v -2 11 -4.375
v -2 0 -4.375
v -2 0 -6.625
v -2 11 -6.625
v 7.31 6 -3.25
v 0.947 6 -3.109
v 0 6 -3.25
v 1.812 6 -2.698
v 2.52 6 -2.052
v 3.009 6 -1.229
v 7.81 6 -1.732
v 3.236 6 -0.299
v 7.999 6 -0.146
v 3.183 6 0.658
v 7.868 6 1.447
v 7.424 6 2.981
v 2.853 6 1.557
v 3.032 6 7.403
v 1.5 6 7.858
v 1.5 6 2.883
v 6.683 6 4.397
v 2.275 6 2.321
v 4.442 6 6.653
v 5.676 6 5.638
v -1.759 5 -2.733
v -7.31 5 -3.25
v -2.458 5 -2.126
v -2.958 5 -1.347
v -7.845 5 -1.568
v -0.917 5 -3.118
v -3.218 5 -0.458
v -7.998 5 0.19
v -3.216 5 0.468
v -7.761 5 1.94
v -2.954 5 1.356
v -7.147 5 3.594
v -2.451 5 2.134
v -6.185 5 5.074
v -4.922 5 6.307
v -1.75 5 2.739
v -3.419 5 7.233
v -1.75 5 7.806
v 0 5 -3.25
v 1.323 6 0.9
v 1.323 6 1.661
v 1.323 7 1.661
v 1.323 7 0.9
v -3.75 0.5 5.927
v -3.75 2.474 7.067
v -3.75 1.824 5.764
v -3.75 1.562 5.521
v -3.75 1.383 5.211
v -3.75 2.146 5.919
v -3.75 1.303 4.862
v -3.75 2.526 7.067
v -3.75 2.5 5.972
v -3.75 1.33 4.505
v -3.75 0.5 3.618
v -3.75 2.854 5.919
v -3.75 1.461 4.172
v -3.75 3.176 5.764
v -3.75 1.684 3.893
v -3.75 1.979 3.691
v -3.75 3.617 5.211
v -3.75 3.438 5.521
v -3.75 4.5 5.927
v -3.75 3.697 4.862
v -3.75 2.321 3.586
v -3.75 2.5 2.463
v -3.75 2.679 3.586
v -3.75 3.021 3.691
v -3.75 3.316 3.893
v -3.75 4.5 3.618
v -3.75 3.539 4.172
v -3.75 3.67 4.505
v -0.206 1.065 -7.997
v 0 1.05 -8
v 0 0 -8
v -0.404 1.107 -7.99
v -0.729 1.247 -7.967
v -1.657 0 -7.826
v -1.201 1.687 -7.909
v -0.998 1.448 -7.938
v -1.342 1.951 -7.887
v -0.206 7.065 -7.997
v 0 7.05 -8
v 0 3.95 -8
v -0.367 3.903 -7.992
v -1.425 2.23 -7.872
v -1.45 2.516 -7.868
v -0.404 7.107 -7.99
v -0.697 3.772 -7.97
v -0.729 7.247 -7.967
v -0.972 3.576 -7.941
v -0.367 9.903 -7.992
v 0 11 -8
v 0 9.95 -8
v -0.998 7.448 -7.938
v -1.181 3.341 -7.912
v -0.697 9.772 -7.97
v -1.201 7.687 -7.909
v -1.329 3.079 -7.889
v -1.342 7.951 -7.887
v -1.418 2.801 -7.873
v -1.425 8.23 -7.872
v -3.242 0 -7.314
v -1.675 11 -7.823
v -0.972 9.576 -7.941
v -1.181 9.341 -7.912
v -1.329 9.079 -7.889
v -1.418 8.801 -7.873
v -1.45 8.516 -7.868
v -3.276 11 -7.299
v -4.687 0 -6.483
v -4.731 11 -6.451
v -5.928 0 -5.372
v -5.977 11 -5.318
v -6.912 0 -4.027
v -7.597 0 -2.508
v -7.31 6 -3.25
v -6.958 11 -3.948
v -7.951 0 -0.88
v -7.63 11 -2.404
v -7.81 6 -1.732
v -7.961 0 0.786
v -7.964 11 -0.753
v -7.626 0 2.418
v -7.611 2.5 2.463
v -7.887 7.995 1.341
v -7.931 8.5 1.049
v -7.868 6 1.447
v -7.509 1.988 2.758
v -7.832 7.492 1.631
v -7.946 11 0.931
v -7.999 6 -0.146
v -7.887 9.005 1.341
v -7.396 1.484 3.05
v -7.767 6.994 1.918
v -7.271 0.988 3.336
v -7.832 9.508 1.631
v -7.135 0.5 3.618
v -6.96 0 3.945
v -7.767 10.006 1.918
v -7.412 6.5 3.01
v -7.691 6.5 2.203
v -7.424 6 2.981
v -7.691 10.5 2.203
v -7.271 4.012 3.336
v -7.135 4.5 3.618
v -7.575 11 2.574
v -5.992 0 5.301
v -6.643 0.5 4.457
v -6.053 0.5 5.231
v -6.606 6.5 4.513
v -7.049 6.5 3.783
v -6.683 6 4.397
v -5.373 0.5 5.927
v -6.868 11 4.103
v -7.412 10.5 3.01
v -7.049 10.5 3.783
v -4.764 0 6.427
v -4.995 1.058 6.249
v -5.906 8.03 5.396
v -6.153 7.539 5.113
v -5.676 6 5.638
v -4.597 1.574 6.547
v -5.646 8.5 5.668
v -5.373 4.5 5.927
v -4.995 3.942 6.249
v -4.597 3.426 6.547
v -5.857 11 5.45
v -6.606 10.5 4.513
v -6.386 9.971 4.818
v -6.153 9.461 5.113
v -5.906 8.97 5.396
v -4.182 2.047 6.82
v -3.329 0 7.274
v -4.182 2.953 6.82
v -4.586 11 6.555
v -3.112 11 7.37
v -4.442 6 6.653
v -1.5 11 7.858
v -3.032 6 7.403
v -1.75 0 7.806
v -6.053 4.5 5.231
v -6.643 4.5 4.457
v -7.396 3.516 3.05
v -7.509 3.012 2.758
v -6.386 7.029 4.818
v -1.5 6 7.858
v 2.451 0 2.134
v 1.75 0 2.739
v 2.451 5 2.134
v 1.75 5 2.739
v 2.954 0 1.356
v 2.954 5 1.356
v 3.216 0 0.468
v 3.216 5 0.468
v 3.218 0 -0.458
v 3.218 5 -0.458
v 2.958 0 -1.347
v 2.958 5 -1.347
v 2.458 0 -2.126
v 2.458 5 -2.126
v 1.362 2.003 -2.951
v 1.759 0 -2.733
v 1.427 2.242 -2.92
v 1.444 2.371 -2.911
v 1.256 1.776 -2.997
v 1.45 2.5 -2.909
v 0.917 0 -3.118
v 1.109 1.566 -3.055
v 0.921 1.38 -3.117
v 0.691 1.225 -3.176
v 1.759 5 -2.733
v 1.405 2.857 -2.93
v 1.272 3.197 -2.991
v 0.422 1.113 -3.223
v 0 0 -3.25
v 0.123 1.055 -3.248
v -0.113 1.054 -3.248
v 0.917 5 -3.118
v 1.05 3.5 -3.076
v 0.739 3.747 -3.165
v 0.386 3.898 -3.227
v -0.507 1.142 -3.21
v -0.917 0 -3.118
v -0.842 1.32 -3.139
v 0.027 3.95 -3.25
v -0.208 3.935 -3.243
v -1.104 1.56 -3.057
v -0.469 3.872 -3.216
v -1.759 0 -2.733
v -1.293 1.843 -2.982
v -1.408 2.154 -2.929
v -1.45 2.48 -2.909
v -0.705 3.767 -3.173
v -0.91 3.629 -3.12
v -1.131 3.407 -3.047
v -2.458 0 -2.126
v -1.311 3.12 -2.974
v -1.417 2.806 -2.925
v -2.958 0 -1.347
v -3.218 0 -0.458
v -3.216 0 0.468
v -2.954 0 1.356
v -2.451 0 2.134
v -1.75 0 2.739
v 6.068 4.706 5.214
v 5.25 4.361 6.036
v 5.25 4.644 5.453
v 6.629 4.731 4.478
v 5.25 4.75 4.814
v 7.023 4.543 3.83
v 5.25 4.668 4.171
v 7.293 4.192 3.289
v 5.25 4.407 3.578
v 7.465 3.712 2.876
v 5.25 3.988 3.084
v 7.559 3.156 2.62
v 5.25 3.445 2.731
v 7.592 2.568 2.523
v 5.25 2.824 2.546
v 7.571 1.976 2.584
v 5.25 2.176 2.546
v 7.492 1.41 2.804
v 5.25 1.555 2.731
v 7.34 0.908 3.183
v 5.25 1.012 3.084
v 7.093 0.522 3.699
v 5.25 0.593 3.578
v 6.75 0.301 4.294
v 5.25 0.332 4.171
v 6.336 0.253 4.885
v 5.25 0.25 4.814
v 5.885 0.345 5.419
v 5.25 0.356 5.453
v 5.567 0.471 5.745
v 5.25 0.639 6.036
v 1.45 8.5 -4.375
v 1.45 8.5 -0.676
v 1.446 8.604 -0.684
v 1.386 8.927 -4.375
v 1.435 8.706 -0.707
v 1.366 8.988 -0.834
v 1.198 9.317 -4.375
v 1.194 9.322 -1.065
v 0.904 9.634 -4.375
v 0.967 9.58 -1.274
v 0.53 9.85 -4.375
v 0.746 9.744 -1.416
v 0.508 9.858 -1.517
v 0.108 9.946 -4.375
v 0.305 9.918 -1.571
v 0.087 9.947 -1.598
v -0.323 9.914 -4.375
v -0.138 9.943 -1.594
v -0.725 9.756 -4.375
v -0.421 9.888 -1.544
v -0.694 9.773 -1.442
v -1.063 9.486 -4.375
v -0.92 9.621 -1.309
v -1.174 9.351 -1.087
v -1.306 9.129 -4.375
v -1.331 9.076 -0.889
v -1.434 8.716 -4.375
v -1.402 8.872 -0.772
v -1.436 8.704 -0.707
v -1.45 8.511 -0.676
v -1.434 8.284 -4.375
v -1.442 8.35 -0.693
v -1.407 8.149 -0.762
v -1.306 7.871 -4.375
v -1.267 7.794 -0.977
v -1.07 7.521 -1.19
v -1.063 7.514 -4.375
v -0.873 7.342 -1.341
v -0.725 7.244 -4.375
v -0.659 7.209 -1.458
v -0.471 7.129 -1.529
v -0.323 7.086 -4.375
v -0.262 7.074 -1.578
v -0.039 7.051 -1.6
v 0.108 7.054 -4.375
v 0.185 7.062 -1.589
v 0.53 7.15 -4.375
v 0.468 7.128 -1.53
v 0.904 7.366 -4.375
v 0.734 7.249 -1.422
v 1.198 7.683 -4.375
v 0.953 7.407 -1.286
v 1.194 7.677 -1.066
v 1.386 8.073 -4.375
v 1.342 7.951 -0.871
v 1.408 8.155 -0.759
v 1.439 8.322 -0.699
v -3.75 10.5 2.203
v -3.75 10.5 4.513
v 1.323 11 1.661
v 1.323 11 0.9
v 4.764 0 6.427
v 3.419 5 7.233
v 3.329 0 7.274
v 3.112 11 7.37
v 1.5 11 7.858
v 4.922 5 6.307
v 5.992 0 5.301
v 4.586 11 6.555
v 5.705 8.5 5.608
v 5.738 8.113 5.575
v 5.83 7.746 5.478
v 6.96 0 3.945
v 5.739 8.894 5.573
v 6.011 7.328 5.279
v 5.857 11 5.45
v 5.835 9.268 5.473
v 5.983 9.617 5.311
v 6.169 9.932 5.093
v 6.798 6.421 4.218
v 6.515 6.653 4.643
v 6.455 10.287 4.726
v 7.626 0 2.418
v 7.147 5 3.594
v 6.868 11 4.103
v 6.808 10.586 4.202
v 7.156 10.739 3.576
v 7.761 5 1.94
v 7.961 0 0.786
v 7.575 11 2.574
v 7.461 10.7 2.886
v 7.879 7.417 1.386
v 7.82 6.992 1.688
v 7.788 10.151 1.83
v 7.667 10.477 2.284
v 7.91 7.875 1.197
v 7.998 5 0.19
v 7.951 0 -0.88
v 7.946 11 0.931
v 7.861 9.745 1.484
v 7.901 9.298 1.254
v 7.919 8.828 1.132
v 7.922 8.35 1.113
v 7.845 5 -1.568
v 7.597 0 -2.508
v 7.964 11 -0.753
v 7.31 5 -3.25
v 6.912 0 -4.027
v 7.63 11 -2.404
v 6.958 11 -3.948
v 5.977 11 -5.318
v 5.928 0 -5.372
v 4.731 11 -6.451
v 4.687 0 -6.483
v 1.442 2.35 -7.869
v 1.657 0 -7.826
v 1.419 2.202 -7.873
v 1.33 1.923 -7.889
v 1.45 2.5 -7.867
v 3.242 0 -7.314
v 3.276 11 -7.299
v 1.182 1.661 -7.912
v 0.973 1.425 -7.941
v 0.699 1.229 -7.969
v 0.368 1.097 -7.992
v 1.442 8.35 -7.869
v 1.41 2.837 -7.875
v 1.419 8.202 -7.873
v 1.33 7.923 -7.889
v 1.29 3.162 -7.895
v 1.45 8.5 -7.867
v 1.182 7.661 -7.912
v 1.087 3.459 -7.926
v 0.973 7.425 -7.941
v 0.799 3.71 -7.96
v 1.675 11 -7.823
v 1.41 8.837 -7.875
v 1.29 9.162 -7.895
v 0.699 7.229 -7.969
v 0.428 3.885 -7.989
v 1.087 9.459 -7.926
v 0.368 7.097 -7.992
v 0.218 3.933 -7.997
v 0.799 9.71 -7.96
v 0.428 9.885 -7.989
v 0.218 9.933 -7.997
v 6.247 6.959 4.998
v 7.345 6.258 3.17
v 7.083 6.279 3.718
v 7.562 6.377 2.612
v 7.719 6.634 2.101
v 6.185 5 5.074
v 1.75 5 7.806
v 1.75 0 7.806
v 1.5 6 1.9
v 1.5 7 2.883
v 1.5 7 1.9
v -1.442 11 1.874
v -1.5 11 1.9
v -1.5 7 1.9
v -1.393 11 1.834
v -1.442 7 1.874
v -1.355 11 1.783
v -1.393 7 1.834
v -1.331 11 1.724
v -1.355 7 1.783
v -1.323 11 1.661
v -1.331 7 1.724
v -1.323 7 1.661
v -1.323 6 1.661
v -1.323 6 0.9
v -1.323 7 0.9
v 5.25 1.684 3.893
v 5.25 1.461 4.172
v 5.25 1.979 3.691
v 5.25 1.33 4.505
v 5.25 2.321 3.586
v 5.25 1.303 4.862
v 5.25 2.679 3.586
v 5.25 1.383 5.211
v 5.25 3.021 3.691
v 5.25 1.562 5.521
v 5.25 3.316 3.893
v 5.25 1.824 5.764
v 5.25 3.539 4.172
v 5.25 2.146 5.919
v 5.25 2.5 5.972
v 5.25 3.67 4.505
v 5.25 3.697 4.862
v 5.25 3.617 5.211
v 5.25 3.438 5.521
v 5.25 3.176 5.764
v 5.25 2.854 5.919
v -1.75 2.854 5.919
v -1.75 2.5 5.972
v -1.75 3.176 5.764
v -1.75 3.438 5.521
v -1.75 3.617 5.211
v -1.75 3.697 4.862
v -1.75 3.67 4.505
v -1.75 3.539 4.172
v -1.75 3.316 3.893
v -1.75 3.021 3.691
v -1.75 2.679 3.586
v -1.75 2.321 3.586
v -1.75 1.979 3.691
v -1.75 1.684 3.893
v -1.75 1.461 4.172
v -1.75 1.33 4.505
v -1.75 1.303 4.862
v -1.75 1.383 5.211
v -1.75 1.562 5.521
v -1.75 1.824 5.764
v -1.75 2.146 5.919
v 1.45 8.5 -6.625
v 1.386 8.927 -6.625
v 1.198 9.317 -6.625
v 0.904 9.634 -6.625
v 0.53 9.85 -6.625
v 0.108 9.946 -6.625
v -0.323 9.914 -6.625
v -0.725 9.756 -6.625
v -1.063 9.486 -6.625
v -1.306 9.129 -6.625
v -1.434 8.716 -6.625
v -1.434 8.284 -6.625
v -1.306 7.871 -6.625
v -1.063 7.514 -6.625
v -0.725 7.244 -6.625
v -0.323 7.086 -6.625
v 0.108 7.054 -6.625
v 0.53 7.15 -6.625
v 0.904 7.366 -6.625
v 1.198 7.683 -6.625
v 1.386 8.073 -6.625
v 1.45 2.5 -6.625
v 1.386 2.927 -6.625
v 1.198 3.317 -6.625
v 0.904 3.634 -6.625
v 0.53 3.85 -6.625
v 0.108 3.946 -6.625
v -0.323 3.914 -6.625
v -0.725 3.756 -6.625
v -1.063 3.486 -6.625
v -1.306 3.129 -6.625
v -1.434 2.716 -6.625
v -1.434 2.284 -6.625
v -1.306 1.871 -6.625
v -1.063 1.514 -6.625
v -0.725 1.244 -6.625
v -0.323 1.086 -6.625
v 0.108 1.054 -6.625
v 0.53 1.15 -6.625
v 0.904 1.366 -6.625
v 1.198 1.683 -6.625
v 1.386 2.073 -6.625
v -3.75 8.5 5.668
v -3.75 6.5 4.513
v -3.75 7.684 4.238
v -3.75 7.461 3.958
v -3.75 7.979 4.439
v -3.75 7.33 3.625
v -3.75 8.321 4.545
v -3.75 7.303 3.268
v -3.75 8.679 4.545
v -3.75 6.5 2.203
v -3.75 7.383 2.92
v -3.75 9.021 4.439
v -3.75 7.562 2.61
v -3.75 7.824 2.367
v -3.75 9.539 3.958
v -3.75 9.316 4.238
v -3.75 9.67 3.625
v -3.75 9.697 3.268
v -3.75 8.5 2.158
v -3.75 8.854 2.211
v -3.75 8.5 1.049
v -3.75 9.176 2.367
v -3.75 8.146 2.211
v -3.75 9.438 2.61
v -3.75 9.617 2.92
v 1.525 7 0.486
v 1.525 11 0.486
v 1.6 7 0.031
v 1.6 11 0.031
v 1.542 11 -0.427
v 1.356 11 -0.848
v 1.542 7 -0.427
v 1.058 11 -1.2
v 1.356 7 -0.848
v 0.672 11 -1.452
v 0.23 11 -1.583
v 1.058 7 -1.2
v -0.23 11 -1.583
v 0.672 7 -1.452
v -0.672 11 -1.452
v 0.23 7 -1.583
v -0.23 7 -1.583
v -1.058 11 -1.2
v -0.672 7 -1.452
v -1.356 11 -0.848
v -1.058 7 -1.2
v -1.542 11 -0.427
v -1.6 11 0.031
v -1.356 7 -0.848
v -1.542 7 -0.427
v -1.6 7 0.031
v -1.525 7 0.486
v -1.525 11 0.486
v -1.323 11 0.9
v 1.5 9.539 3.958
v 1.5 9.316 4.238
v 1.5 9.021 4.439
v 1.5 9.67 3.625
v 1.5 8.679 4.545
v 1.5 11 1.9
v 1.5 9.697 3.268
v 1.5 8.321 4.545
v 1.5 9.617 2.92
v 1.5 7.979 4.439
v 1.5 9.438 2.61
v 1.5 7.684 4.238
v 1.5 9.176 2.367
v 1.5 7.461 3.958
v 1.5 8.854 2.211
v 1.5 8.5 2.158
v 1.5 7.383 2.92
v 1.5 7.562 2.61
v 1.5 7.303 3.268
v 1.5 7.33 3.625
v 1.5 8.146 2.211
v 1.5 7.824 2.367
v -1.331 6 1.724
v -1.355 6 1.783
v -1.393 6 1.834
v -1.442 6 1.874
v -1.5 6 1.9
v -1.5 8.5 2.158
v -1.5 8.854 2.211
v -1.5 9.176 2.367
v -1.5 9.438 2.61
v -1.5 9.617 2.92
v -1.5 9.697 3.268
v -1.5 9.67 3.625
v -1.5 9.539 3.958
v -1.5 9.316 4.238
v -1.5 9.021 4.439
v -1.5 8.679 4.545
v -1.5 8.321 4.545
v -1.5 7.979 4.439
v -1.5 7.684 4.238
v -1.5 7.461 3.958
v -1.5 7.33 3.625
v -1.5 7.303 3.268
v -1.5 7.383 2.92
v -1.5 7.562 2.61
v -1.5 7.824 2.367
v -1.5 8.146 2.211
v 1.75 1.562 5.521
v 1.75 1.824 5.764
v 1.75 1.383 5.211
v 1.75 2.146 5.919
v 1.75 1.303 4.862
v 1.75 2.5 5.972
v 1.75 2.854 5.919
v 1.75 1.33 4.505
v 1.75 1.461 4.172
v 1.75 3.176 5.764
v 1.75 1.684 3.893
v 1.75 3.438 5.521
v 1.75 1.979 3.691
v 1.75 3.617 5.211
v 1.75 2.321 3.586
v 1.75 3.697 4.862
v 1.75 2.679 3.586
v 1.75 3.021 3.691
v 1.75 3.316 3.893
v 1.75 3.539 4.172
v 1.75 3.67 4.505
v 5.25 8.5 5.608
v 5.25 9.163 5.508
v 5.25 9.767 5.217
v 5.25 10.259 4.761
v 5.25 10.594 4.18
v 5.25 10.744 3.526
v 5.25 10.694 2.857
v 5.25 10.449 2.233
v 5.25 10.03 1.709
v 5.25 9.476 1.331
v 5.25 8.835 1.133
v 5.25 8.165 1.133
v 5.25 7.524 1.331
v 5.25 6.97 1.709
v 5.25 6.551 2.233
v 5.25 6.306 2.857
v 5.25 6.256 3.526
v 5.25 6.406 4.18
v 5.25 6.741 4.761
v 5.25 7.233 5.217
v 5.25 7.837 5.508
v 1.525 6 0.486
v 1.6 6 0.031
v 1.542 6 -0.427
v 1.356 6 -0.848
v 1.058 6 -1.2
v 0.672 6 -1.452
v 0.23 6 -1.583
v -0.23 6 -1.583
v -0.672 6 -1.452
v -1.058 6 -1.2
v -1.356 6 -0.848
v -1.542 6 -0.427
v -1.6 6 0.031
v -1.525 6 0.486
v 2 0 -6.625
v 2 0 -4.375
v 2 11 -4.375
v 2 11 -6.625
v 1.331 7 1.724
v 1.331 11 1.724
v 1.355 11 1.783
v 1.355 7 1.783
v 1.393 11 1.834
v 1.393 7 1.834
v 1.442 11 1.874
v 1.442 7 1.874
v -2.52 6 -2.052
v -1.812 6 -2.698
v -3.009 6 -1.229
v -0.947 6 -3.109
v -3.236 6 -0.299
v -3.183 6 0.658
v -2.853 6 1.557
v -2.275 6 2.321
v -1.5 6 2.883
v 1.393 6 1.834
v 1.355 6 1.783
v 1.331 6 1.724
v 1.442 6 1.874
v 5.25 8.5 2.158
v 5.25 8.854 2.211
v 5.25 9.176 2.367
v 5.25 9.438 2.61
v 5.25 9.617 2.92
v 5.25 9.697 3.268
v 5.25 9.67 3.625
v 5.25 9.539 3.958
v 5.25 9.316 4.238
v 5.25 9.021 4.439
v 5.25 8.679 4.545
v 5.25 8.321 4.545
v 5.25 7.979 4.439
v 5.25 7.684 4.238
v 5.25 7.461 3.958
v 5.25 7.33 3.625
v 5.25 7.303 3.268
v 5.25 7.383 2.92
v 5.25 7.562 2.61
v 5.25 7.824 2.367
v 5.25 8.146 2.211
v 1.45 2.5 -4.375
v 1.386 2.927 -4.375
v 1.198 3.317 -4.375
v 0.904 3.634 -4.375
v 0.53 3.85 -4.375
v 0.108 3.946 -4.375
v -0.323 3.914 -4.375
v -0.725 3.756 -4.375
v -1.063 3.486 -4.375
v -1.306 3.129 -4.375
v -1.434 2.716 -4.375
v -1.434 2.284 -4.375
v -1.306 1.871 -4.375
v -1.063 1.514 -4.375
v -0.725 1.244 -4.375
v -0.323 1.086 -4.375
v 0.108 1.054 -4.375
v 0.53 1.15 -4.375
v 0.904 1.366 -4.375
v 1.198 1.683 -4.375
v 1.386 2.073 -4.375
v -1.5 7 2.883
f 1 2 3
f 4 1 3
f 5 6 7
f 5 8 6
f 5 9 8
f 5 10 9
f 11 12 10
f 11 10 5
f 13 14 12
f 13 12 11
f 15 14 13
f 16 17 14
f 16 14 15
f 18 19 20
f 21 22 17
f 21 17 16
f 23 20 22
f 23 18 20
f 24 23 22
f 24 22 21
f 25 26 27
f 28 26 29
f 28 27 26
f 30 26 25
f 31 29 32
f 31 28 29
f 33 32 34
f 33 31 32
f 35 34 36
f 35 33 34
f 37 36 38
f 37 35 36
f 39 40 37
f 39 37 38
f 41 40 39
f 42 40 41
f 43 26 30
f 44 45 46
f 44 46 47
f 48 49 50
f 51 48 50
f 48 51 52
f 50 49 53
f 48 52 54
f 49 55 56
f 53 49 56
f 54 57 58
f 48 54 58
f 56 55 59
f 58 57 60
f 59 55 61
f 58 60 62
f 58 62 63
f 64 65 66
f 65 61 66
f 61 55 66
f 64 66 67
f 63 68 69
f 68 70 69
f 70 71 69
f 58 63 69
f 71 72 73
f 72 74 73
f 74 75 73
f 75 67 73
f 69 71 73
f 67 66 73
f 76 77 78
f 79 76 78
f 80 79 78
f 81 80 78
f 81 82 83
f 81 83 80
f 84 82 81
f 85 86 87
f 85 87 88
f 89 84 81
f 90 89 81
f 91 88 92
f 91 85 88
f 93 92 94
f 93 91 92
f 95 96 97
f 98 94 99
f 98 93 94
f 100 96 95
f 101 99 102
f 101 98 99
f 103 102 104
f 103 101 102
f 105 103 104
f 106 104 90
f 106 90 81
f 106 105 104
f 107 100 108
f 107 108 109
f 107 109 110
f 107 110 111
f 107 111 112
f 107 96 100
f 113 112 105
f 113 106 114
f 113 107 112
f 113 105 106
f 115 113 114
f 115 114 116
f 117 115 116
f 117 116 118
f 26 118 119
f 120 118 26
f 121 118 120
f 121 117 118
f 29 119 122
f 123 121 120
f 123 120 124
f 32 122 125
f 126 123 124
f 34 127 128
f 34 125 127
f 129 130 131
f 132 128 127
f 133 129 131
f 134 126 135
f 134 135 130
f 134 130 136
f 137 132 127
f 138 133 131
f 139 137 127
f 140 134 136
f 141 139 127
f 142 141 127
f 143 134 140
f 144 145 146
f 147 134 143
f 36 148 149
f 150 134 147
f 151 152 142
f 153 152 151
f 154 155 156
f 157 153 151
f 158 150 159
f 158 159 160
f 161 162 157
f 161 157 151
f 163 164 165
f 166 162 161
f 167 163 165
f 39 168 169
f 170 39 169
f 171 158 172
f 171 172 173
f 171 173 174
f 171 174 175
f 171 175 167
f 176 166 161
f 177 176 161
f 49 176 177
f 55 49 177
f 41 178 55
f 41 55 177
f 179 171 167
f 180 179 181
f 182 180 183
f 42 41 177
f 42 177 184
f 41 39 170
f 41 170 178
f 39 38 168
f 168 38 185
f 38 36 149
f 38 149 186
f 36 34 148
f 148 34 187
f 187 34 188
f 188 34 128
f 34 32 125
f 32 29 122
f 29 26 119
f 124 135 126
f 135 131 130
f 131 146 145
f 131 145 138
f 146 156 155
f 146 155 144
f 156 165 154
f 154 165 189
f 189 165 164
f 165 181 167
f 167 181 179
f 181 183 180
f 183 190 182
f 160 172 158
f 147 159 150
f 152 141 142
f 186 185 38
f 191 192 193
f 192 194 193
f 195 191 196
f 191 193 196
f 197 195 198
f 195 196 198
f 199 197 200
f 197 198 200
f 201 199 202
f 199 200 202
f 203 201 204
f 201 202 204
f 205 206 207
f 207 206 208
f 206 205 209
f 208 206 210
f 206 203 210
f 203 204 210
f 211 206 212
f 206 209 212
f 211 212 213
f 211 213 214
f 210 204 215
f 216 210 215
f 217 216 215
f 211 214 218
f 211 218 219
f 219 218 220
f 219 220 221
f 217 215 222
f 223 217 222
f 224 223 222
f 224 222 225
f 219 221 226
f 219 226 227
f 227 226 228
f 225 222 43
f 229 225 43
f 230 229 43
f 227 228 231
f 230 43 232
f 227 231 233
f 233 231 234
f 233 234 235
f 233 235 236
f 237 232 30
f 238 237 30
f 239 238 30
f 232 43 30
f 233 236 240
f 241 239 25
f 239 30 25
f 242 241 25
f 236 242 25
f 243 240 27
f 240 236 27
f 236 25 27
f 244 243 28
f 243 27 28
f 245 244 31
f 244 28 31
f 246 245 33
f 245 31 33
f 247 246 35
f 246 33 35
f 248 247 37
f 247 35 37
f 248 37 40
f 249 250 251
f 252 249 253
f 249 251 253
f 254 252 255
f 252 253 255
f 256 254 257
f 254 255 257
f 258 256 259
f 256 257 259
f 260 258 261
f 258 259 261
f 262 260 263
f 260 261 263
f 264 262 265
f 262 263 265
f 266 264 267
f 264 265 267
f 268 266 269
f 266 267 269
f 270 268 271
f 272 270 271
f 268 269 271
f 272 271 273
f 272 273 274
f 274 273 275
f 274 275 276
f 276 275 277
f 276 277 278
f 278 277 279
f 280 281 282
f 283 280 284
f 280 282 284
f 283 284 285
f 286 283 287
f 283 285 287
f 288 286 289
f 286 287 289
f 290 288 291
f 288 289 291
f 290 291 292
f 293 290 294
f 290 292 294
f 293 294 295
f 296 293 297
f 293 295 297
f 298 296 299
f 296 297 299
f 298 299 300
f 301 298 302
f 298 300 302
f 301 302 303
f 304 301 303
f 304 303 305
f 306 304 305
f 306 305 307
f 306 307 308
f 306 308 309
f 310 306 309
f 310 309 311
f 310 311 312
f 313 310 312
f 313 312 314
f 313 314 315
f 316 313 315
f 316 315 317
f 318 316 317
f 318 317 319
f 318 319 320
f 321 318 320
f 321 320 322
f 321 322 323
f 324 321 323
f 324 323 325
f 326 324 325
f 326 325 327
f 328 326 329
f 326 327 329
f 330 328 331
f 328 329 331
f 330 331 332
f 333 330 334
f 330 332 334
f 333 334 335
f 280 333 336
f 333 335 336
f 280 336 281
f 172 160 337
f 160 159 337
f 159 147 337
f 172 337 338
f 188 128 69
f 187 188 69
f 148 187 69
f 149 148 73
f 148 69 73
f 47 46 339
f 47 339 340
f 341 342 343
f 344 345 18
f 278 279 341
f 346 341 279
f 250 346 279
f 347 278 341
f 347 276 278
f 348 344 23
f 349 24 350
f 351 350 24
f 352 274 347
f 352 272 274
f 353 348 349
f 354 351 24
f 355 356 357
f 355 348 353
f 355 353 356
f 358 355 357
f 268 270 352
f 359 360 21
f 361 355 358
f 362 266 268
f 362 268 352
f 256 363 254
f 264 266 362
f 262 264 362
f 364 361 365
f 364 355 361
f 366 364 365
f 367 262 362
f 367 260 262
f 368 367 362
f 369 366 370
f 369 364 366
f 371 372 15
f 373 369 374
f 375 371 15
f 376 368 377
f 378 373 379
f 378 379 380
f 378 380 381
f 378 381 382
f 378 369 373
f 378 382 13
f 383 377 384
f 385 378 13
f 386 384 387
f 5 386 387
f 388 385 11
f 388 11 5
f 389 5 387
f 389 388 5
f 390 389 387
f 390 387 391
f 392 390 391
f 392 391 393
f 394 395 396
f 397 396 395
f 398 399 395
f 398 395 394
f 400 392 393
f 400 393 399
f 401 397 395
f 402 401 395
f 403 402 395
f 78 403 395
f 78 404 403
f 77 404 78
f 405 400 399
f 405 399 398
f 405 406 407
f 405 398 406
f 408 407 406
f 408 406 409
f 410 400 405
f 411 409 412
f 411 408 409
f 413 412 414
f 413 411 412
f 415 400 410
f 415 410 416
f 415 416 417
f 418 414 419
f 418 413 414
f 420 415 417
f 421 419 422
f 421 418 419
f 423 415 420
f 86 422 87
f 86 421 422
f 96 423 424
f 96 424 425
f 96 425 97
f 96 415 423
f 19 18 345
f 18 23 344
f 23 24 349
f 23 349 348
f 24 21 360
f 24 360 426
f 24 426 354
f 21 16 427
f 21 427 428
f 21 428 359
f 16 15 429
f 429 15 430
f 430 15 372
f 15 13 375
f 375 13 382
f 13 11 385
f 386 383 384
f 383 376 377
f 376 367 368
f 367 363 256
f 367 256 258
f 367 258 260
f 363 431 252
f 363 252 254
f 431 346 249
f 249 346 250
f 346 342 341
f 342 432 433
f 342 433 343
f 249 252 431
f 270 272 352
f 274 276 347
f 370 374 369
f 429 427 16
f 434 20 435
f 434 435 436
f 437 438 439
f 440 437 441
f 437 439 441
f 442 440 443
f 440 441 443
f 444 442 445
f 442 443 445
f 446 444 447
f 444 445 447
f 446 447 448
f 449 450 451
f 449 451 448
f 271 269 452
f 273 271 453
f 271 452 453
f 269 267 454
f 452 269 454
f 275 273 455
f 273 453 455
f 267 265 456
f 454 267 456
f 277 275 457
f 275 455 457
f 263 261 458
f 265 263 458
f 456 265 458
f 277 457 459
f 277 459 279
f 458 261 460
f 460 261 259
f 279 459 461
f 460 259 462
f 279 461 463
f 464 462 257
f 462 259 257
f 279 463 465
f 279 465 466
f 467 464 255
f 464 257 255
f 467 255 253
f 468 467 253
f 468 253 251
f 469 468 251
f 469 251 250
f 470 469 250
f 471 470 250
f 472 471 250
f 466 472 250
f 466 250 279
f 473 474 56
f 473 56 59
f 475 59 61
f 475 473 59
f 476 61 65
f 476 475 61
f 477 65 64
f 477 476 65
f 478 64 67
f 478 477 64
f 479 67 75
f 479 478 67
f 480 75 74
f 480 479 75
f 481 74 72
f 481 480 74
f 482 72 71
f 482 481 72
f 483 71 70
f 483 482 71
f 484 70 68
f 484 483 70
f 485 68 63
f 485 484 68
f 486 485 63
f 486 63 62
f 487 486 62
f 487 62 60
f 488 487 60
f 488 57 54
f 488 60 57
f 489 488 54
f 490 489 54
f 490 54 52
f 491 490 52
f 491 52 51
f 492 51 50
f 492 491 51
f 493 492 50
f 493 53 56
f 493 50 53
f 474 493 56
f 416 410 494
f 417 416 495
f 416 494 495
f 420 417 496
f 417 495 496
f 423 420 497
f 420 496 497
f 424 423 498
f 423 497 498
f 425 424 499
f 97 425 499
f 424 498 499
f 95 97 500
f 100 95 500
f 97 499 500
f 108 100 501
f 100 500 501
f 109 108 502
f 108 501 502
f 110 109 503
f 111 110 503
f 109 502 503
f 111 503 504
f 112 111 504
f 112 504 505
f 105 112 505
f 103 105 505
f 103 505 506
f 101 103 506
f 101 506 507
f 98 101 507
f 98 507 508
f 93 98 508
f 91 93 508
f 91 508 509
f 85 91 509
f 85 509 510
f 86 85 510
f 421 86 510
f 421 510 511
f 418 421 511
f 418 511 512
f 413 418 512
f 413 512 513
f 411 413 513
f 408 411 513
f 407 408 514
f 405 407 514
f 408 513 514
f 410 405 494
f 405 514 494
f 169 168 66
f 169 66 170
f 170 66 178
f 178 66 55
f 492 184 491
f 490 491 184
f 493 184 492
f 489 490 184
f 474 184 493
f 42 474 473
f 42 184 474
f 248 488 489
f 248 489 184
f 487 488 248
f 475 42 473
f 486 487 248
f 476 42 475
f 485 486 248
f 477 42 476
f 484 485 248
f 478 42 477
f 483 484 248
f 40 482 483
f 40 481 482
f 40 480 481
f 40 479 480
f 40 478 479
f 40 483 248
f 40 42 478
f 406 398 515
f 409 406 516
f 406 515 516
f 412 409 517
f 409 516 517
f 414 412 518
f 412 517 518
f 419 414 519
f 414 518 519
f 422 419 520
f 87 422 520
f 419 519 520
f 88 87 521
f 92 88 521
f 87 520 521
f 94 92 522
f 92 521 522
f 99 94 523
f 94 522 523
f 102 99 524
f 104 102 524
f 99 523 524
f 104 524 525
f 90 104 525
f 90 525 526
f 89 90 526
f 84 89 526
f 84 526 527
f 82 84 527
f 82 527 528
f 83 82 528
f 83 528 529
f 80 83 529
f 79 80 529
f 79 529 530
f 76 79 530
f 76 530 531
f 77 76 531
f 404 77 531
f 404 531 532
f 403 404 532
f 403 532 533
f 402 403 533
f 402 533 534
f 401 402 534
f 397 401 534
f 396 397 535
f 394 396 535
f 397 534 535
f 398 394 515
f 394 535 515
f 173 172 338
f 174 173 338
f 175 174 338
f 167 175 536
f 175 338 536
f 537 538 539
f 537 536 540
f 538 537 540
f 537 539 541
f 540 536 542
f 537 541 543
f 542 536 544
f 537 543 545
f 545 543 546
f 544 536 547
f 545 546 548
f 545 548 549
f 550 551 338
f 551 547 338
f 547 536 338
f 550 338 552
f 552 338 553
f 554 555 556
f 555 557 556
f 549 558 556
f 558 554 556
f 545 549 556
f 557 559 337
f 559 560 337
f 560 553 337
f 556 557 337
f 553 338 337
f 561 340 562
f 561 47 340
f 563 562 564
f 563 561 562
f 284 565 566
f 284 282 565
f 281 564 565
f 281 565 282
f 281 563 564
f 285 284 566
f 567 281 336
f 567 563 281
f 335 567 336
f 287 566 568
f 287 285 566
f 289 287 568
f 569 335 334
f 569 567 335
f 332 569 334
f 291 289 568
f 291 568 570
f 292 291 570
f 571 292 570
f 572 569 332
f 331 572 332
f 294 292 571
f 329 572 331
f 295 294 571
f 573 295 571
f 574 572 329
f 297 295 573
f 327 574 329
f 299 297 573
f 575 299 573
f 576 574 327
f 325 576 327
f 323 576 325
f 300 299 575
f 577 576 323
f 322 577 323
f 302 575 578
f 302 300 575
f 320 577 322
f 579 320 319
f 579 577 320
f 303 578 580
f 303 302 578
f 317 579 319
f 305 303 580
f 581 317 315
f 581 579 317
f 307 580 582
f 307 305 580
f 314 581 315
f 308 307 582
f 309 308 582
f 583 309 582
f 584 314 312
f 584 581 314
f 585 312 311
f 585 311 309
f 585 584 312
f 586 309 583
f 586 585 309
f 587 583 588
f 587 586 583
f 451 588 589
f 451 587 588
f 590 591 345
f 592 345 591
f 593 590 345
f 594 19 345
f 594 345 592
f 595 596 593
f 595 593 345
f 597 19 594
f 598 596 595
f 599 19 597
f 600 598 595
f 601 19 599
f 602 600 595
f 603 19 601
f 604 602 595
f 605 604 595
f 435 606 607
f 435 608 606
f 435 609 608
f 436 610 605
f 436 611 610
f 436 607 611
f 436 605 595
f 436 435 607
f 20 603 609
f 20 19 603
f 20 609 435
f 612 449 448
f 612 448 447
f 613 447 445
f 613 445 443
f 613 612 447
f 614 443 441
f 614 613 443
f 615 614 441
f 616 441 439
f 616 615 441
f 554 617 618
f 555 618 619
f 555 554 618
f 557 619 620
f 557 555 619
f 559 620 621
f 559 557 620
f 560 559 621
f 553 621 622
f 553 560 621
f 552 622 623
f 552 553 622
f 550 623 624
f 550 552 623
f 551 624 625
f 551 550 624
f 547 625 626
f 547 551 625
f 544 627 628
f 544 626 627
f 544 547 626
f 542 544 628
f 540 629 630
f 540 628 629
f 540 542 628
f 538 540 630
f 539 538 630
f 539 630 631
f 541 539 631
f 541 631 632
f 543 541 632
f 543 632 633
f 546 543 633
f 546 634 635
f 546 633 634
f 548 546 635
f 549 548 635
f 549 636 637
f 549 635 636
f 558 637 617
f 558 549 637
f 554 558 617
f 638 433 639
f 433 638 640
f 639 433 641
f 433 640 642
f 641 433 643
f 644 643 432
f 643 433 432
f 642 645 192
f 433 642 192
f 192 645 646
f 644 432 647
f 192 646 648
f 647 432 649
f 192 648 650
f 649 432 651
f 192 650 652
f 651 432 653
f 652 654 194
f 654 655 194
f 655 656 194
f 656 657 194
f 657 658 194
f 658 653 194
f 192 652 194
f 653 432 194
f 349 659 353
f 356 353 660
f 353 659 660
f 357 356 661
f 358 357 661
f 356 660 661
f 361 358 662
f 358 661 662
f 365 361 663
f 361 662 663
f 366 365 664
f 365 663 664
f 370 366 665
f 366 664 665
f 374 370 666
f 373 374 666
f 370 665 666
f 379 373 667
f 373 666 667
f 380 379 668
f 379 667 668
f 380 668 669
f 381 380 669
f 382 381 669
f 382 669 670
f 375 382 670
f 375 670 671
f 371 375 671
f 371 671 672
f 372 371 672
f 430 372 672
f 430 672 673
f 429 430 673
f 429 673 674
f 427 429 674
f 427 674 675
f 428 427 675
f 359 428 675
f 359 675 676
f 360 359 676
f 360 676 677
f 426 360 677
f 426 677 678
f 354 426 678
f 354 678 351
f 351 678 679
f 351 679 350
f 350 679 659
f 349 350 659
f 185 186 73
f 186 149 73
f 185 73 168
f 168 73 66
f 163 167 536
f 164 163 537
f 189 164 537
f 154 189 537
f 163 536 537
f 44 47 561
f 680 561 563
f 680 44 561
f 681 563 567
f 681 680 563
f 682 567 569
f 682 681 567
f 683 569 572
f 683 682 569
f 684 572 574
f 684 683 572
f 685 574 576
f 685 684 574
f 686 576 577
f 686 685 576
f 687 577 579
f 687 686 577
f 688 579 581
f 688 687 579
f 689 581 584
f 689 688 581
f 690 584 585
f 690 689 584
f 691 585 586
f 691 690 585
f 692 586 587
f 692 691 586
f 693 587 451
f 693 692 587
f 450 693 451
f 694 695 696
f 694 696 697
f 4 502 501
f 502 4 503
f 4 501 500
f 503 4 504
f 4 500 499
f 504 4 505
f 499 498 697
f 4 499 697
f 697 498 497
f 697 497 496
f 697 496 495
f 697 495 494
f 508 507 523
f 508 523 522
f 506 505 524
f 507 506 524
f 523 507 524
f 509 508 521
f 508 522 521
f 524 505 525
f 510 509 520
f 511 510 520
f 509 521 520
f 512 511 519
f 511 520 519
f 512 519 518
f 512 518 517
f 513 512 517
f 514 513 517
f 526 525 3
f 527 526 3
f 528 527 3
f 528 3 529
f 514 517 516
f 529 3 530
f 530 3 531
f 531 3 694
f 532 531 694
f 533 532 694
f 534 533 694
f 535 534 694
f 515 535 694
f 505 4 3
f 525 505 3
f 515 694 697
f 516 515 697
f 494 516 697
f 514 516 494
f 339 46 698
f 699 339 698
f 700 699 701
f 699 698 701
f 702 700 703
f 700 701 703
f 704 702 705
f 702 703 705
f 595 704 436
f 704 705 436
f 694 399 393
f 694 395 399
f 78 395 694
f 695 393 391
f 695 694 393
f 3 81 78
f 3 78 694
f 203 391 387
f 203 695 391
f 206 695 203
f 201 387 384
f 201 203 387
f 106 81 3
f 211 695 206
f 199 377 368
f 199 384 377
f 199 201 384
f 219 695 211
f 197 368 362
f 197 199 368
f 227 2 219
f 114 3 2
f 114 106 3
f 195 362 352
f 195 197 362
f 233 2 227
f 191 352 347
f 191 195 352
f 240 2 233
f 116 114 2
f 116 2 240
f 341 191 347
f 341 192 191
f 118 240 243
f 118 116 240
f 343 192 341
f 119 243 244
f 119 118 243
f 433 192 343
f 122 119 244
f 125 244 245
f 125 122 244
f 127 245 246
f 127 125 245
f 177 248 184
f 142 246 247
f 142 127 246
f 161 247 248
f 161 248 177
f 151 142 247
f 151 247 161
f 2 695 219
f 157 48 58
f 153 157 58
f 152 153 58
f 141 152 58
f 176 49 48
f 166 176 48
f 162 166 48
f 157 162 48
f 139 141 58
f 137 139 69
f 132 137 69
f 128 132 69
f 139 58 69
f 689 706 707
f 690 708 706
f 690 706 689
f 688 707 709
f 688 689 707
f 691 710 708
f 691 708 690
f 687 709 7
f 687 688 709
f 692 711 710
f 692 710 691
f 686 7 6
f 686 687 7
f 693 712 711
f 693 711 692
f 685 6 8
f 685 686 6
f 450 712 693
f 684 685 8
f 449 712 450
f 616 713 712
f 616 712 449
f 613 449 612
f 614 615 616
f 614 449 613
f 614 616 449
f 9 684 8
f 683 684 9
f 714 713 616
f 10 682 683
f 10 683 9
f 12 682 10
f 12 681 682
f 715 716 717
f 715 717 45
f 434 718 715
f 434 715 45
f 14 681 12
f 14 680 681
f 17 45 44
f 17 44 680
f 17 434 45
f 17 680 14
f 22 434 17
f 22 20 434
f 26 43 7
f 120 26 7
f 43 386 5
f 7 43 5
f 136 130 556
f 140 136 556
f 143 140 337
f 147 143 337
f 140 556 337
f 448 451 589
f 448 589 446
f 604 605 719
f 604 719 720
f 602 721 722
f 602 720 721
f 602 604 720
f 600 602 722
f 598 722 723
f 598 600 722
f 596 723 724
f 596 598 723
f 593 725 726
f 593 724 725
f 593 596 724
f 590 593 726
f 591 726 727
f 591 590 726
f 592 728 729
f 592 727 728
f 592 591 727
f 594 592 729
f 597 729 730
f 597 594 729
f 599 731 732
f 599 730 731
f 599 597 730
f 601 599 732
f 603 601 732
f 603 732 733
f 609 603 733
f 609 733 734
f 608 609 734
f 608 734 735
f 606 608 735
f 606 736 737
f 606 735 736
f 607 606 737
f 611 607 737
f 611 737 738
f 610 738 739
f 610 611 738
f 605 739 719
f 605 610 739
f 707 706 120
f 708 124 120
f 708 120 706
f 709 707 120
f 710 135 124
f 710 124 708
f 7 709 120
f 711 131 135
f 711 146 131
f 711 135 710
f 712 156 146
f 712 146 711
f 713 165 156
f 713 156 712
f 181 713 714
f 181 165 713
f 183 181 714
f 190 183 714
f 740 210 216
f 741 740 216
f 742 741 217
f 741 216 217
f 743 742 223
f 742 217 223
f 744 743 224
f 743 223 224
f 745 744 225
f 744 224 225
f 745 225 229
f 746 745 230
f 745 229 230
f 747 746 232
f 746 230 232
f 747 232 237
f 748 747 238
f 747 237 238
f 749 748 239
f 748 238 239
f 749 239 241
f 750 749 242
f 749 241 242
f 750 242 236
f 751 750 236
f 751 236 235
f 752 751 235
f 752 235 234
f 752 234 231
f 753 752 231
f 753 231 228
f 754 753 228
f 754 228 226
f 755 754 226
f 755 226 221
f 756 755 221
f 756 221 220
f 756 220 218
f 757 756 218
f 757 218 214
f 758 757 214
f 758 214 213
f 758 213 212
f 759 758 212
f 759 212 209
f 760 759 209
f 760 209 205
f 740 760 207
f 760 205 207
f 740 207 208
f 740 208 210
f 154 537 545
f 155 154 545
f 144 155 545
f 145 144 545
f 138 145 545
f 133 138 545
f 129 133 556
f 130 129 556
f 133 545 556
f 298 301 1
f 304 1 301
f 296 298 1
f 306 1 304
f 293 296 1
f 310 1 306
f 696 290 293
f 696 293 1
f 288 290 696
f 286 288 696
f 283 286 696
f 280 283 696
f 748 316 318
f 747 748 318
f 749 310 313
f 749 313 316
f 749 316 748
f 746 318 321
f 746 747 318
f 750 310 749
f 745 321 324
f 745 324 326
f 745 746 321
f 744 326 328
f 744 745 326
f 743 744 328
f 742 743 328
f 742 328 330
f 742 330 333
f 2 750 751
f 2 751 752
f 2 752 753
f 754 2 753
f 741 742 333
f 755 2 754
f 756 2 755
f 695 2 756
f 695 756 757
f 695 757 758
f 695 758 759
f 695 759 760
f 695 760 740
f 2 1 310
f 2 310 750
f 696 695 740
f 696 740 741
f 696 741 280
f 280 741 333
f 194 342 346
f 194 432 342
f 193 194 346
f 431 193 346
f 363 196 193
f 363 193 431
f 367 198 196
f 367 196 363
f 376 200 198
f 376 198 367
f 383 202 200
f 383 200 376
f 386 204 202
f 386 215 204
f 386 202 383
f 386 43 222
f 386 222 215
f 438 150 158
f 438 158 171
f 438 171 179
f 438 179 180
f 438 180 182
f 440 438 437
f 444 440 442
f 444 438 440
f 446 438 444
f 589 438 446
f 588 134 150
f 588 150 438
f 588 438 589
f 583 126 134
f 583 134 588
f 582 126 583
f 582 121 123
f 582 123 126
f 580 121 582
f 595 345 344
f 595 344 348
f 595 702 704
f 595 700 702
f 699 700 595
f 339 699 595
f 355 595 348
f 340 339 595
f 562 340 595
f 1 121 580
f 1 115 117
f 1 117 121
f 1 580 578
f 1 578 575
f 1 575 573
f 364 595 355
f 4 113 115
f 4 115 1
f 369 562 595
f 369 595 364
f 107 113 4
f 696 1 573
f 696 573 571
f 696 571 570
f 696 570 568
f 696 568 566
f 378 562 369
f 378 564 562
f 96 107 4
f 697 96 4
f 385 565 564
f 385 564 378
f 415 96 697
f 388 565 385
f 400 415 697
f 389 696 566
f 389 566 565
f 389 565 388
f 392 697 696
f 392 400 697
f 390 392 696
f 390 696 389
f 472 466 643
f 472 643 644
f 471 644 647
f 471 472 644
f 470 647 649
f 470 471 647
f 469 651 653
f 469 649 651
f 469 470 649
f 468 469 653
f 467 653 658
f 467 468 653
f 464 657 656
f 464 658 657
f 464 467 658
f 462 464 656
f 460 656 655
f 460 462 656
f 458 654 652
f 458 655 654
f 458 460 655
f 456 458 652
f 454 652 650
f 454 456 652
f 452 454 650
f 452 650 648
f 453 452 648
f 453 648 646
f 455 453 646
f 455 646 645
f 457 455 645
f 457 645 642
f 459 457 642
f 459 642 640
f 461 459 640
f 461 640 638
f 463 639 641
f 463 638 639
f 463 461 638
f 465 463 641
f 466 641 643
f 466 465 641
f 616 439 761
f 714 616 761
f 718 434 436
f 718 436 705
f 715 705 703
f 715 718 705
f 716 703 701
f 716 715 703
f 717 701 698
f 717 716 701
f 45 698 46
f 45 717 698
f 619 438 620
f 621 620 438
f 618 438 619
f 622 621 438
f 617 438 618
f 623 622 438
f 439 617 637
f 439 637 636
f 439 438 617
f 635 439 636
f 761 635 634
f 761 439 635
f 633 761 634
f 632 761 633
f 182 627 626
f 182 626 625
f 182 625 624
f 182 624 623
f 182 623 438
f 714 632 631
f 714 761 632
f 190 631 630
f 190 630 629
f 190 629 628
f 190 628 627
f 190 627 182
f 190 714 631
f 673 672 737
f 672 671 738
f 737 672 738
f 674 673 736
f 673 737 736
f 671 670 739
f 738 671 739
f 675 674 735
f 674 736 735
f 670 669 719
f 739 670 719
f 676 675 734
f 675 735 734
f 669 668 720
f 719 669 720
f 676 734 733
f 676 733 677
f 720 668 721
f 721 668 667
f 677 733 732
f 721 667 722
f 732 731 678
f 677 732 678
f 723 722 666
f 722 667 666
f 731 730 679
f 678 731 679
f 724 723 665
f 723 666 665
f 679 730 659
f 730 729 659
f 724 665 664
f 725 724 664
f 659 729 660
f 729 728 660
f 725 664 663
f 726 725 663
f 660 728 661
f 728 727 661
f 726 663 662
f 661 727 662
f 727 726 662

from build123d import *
from build123d.topology import SkipClean

# Parameters (mm, degrees)
SKETCH1_W                            = 4.75
SKETCH1_H                            = 7
FILLET1_R                            = 1
SKETCH16_W                           = 16
SKETCH16_H                           = 1
CUT_EXTRUDE5_DEPTH                   = 1
CUT_EXTRUDE5_DIRECTION_2_REACH       = 18.492
CUT_EXTRUDE6_REACH                   = 15.304
SKETCH17_W                           = 3.5
SKETCH17_H                           = 5.261387212
CUT_EXTRUDE7_DEPTH                   = 18.408690359
CUT_EXTRUDE7_DEPTH_BACK              = 18.408690359
SKETCH18_R                           = 1.2
CUT_EXTRUDE10_START                  = -6
SKETCH21_R                           = 1.6
CUT_EXTRUDE10_DEPTH                  = 6
CUT_EXTRUDE11_DEPTH                  = 18.26991621
CUT_EXTRUDE11_DEPTH_BACK             = 18.26991621
SKETCH22_R                           = 1.2
CUT_EXTRUDE9_REACH                   = 20.603
CUT_EXTRUDE9_END_RADIUS              = 8
SKETCH20_R                           = 1.2
CUT_EXTRUDE12_REACH                  = 21.585
SKETCH19_R                           = 2.25
CUT_EXTRUDE13_REACH                  = 21.585
CUT_EXTRUDE13_END_RADIUS             = 8
SKETCH24_R                           = 2.25
CUT_EXTRUDE14_REACH                  = 18.492
CUT_EXTRUDE14_END_RADIUS             = 8
SKETCH25_W                           = 2.25
SKETCH25_H                           = 1
CUT_EXTRUDE14_DIRECTION_2_REACH      = 18.492
CUT_EXTRUDE14_DIRECTION_2_END_RADIUS = 8
M2_5_CLEARANCE_HOLE1_D               = 2.9
M2_5_CLEARANCE_HOLE1_DEPTH           = 8.029752102
M2_5_CLEARANCE_HOLE1_TIP             = 0.871247898
CUT_EXTRUDE15_START                  = -12
SKETCH29_W                           = 4
SKETCH29_H                           = 2.25
CUT_EXTRUDE15_DEPTH                  = 12
FILLET3_R                            = 0.25
SKETCH30_R                           = 8
CUT_EXTRUDE19_DEPTH                  = 1
BOSS_EXTRUDE1_START                  = 1
BOSS_EXTRUDE1_DEPTH                  = 1


with BuildPart() as part:
    # Sketch1 → Revolve1 (revolve)
    with BuildSketch(Plane.XY, mode=Mode.PRIVATE) as revolve1_sk:
        with Locations((5.625, 3.5)):
            Rectangle(SKETCH1_W, SKETCH1_H)
    revolve(revolve1_sk.sketch.rotate(Axis((0, 0, 0), (0, 1, 0)), 90), axis=Axis((0, 0, 0), (0, 1, 0)))

    # Sketch1<3> → Revolve2 (revolve)
    with BuildSketch(Plane.XY, mode=Mode.PRIVATE) as revolve2_sk:
        Polygon((1.6, 7), (3.25, 7), (8, 7), (8, 12), (1.6, 12), align=None)
    revolve(revolve2_sk.sketch.rotate(Axis((0, 0, 0), (0, 1, 0)), 90), axis=Axis((0, 0, 0), (0, 1, 0)))

    # Fillet1
    fillet1_edges = [part.edges().sort_by_distance(p)[0] for p in [
        (0, 12, 8),
    ]]
    fillet(fillet1_edges, radius=FILLET1_R)

    # Sketch16 → Cut-Extrude5 (cut)
    with BuildSketch(Plane.XY):
        with Locations((0, 5.5)):
            Rectangle(SKETCH16_W, SKETCH16_H)
    extrude(amount=-CUT_EXTRUDE5_DEPTH, mode=Mode.SUBTRACT)

    # Sketch16 → Cut-Extrude5 direction 2 (cut, up to next)
    with BuildSketch(Plane.XY, mode=Mode.PRIVATE) as cut_extrude5_direction_2_sk1:
        with Locations((0, 5.5)):
            Rectangle(SKETCH16_W, SKETCH16_H)
    cut_extrude5_direction_2_tool1 = extrude(cut_extrude5_direction_2_sk1.sketch, amount=CUT_EXTRUDE5_DIRECTION_2_REACH, mode=Mode.PRIVATE) & part.part
    add(cut_extrude5_direction_2_tool1.solids().sort_by_distance((0, 5.5, 0))[0], mode=Mode.SUBTRACT)

    # Sketch17 → Cut-Extrude6 (cut, up to next)
    with BuildSketch(Plane(origin=(0, 5, 0), x_dir=(1, 0, 0), z_dir=(0, 1, 0)), mode=Mode.PRIVATE) as cut_extrude6_sk1:
        with Locations((0, -5.369306394)):
            Rectangle(SKETCH17_W, SKETCH17_H)
    cut_extrude6_tool1 = extrude(cut_extrude6_sk1.sketch, amount=-CUT_EXTRUDE6_REACH, mode=Mode.PRIVATE) & part.part
    add(cut_extrude6_tool1.solids().sort_by_distance((0, 5, 5.369306))[0], mode=Mode.SUBTRACT)

    # Sketch18 → Cut-Extrude7 (cut, two sides: drawn at the far end of the back side and taken through both)
    with BuildSketch(Plane.ZY.offset(-1.75).offset(-CUT_EXTRUDE7_DEPTH_BACK)):
        with Locations((4.772430143, 2.5)):
            Circle(SKETCH18_R)
    extrude(amount=CUT_EXTRUDE7_DEPTH + CUT_EXTRUDE7_DEPTH_BACK, mode=Mode.SUBTRACT)

    # Sketch21 → Cut-Extrude10 (cut)
    with BuildSketch(Plane(origin=(0, 12, 0), x_dir=(1, 0, 0), z_dir=(0, 1, 0)).offset(CUT_EXTRUDE10_START)):
        Circle(SKETCH21_R)
        Polygon((-1.5, -1.9), (-1.5, -11.891029443), (1.5, -11.891029443), (1.5, -1.9), (1.322875656, -1.9), (1.322875656, -0.9), (-1.322875656, -0.9), (-1.322875656, -1.9), align=None)
    extrude(amount=CUT_EXTRUDE10_DEPTH, mode=Mode.SUBTRACT)

    # Sketch22 → Cut-Extrude11 (cut, two sides: drawn at the far end of the back side and taken through both)
    with BuildSketch(Plane(origin=(-1.5, 0, 0), x_dir=(0, 0, -1), z_dir=(1, 0, 0)).offset(-CUT_EXTRUDE11_DEPTH_BACK)):
        with Locations((-3.358116823, 8.5)):
            Circle(SKETCH22_R)
    extrude(amount=CUT_EXTRUDE11_DEPTH + CUT_EXTRUDE11_DEPTH_BACK, mode=Mode.SUBTRACT)

    # Cut-Extrude9: up to this cylinder (the profile starts inside it)
    cut_extrude9_end = Plane(origin=(0, 5.9847245, 0), z_dir=(0, -1, 0)) * Cylinder(CUT_EXTRUDE9_END_RADIUS, 65.175449, mode=Mode.PRIVATE)
    # Sketch20 → Cut-Extrude9 (cut, up to the surface)
    with BuildSketch(Plane(origin=(-3.75, 0, 0), x_dir=(0, 0, -1), z_dir=(1, 0, 0)), mode=Mode.PRIVATE) as cut_extrude9_sk1:
        Polygon((-2.463029066, 2.5), (-3.617729604, 4.5), (-5.927130681, 4.5), (-7.08183122, 2.5), (-5.927130681, 0.5), (-3.617729604, 0.5), align=None)
    cut_extrude9_tool1 = extrude(cut_extrude9_sk1.sketch, amount=-CUT_EXTRUDE9_REACH, mode=Mode.PRIVATE) & cut_extrude9_end
    add(cut_extrude9_tool1.solids().sort_by_distance((-3.75, 2.5, 4.77243))[0], mode=Mode.SUBTRACT)
    # Sketch20 → Cut-Extrude9 (cut, up to the surface)
    with BuildSketch(Plane(origin=(-3.75, 0, 0), x_dir=(0, 0, -1), z_dir=(1, 0, 0)), mode=Mode.PRIVATE) as cut_extrude9_sk2:
        Polygon((-1.048715746, 8.5), (-2.203416284, 10.5), (-4.512817361, 10.5), (-5.6675179, 8.5), (-4.512817361, 6.5), (-2.203416284, 6.5), align=None)
        with Locations((-3.358116823, 8.5)):
            Circle(SKETCH20_R, mode=Mode.SUBTRACT)
    cut_extrude9_tool2 = extrude(cut_extrude9_sk2.sketch, amount=-CUT_EXTRUDE9_REACH, mode=Mode.PRIVATE) & cut_extrude9_end
    add(cut_extrude9_tool2.solids().sort_by_distance((-3.75, 9.469449, 1.678981))[0], mode=Mode.SUBTRACT)

    # Sketch19 → Cut-Extrude12 (cut, up to next)
    with BuildSketch(Plane.ZY.offset(-5.25), mode=Mode.PRIVATE) as cut_extrude12_sk1:
        with Locations((4.772430143, 2.5)):
            Circle(SKETCH19_R)
    cut_extrude12_tool1 = extrude(cut_extrude12_sk1.sketch, amount=-CUT_EXTRUDE12_REACH, mode=Mode.PRIVATE) & part.part
    add(cut_extrude12_tool1.solids().sort_by_distance((5.25, 2.5, 4.77243))[0], mode=Mode.SUBTRACT)

    # Cut-Extrude13: up to this cylinder (the profile starts inside it)
    cut_extrude13_end = Plane(origin=(0, 8.5, 0), z_dir=(0, -1, 0)) * Cylinder(CUT_EXTRUDE13_END_RADIUS, 60.17, mode=Mode.PRIVATE)
    # Sketch24 → Cut-Extrude13 (cut, up to the surface)
    with BuildSketch(Plane.ZY.offset(-5.25), mode=Mode.PRIVATE) as cut_extrude13_sk1:
        with Locations((3.358116823, 8.5)):
            Circle(SKETCH24_R)
    cut_extrude13_tool1 = extrude(cut_extrude13_sk1.sketch, amount=-CUT_EXTRUDE13_REACH, mode=Mode.PRIVATE) & cut_extrude13_end
    add(cut_extrude13_tool1.solids().sort_by_distance((5.25, 8.5, 3.358117))[0], mode=Mode.SUBTRACT)

    # Cut-Extrude14: up to this cylinder (the profile starts inside it)
    cut_extrude14_end = Plane(origin=(0, 5.5, 0), z_dir=(0, -1, 0)) * Cylinder(CUT_EXTRUDE14_END_RADIUS, 53.984, mode=Mode.PRIVATE)
    # Sketch25 → Cut-Extrude14 (cut, up to the surface)
    with BuildSketch(Plane.ZY, mode=Mode.PRIVATE) as cut_extrude14_sk1:
        with Locations((-2.125, 5.5)):
            Rectangle(SKETCH25_W, SKETCH25_H)
    cut_extrude14_tool1 = extrude(cut_extrude14_sk1.sketch, amount=-CUT_EXTRUDE14_REACH, mode=Mode.PRIVATE) & cut_extrude14_end
    add(cut_extrude14_tool1.solids().sort_by_distance((0, 5.5, -2.125))[0], mode=Mode.SUBTRACT)

    # Cut-Extrude14 direction 2: up to this cylinder (the profile starts inside it)
    cut_extrude14_direction_2_end = Plane(origin=(0, 5.5, 0), z_dir=(0, -1, 0)) * Cylinder(CUT_EXTRUDE14_DIRECTION_2_END_RADIUS, 53.984, mode=Mode.PRIVATE)
    # Sketch25 → Cut-Extrude14 direction 2 (cut, up to the surface)
    with BuildSketch(Plane.ZY, mode=Mode.PRIVATE) as cut_extrude14_direction_2_sk1:
        with Locations((-2.125, 5.5)):
            Rectangle(SKETCH25_W, SKETCH25_H)
    cut_extrude14_direction_2_tool1 = extrude(cut_extrude14_direction_2_sk1.sketch, amount=CUT_EXTRUDE14_DIRECTION_2_REACH, mode=Mode.PRIVATE) & cut_extrude14_direction_2_end
    add(cut_extrude14_direction_2_tool1.solids().sort_by_distance((0, 5.5, -2.125))[0], mode=Mode.SUBTRACT)

    # M2.5 Clearance Hole1
    with Locations(Plane(origin=(0, 0, -8), x_dir=(-1, 0, 0), z_dir=(0, 0, -1))):
        with Locations((0, 8.5), (0, 2.5)):
            Hole(M2_5_CLEARANCE_HOLE1_D / 2, depth=M2_5_CLEARANCE_HOLE1_DEPTH)
            with Locations((0, 0, -(M2_5_CLEARANCE_HOLE1_DEPTH + M2_5_CLEARANCE_HOLE1_TIP / 2))):  # 118° drill point
                Cone(0, M2_5_CLEARANCE_HOLE1_D / 2, M2_5_CLEARANCE_HOLE1_TIP, mode=Mode.SUBTRACT)

    # Sketch29 → Cut-Extrude15 (cut)
    with BuildSketch(Plane(origin=(0, 12, 0), x_dir=(1, 0, 0), z_dir=(0, 1, 0)).offset(CUT_EXTRUDE15_START)):
        with Locations((0, 5.5)):
            Rectangle(SKETCH29_W, SKETCH29_H)
    extrude(amount=CUT_EXTRUDE15_DEPTH, mode=Mode.SUBTRACT)

    # Fillet3
    # the kernel refuses this fillet: 0.25 mm, written as the material it takes off along each edge
    with BuildSketch(Plane(origin=(-1.322875656, 6.402143732, 1.9), x_dir=(-1, 0, 0), z_dir=(0, 1, 0))) as fillet3_piece_1:
        with BuildLine():
            CenterArc((0.25, -0.239142507), FILLET3_R, 106.94793725, 73.05206275)
            Line((0, -0.239142507), (-0.005, -0.239142507))
            Line((-0.005, -0.239142507), (-0.005, 0))
            Line((-0.005, 0), (0, 0.005))
            ThreePointArc((0, 0.005), (0.088562172, 0.005), (0.175666831, 0.00478285))
            Line((0.175666831, 0.00478285), (0.177124344, 0))
        make_face()
    extrude(amount=6.195712537, mode=Mode.SUBTRACT)
    with BuildSketch(Plane(origin=(1.322875656, 6.402143732, 1.9), x_dir=(1, 0, 0), z_dir=(0, 1, 0))) as fillet3_piece_2:
        with BuildLine():
            CenterArc((0.25, 0.239142507), FILLET3_R, 180, 73.05206275)
            Line((0, 0.239142507), (-0.005, 0.239142507))
            Line((-0.005, 0.239142507), (-0.005, 0))
            Line((-0.005, 0), (0, -0.005))
            ThreePointArc((0, -0.005), (0.088562172, -0.005), (0.175666831, -0.00478285))
            Line((0.175666831, -0.00478285), (0.177124344, 0))
        make_face()
    extrude(amount=6.195712537, mode=Mode.SUBTRACT)

    # Sketch30 → Cut-Extrude19 (cut)
    with BuildSketch(Plane(origin=(0, 12, 0), x_dir=(1, 0, 0), z_dir=(0, 1, 0))):
        Circle(SKETCH30_R)
    extrude(amount=-CUT_EXTRUDE19_DEPTH, mode=Mode.SUBTRACT)

    # Sketch31 → Boss-Extrude1 (add)
    with SkipClean():  # the faces are left unmerged after this step: merging them gives an invalid solid
        with BuildSketch(Plane.XZ.offset(-7).offset(BOSS_EXTRUDE1_START)):
            with BuildLine():
                Line((-1.322875656, 0.9), (-1.322875656, 1.660857493))
                ThreePointArc((-1.322875656, 1.660857493), (-1.371979023, 1.809654479), (-1.5, 1.9))
                Line((-1.5, 1.9), (-1.5, 2.883140649))
                ThreePointArc((-1.5, 2.883140649), (0, -3.25), (1.5, 2.883140649))
                Line((1.5, 2.883140649), (1.5, 1.9))
                ThreePointArc((1.5, 1.9), (1.371979023, 1.809654479), (1.322875656, 1.660857493))
                Line((1.322875656, 1.660857493), (1.322875656, 0.9))
                ThreePointArc((1.322875656, 0.9), (0, -1.6), (-1.322875656, 0.9))
            make_face()
        extrude(amount=-BOSS_EXTRUDE1_DEPTH)


solid = part.part
